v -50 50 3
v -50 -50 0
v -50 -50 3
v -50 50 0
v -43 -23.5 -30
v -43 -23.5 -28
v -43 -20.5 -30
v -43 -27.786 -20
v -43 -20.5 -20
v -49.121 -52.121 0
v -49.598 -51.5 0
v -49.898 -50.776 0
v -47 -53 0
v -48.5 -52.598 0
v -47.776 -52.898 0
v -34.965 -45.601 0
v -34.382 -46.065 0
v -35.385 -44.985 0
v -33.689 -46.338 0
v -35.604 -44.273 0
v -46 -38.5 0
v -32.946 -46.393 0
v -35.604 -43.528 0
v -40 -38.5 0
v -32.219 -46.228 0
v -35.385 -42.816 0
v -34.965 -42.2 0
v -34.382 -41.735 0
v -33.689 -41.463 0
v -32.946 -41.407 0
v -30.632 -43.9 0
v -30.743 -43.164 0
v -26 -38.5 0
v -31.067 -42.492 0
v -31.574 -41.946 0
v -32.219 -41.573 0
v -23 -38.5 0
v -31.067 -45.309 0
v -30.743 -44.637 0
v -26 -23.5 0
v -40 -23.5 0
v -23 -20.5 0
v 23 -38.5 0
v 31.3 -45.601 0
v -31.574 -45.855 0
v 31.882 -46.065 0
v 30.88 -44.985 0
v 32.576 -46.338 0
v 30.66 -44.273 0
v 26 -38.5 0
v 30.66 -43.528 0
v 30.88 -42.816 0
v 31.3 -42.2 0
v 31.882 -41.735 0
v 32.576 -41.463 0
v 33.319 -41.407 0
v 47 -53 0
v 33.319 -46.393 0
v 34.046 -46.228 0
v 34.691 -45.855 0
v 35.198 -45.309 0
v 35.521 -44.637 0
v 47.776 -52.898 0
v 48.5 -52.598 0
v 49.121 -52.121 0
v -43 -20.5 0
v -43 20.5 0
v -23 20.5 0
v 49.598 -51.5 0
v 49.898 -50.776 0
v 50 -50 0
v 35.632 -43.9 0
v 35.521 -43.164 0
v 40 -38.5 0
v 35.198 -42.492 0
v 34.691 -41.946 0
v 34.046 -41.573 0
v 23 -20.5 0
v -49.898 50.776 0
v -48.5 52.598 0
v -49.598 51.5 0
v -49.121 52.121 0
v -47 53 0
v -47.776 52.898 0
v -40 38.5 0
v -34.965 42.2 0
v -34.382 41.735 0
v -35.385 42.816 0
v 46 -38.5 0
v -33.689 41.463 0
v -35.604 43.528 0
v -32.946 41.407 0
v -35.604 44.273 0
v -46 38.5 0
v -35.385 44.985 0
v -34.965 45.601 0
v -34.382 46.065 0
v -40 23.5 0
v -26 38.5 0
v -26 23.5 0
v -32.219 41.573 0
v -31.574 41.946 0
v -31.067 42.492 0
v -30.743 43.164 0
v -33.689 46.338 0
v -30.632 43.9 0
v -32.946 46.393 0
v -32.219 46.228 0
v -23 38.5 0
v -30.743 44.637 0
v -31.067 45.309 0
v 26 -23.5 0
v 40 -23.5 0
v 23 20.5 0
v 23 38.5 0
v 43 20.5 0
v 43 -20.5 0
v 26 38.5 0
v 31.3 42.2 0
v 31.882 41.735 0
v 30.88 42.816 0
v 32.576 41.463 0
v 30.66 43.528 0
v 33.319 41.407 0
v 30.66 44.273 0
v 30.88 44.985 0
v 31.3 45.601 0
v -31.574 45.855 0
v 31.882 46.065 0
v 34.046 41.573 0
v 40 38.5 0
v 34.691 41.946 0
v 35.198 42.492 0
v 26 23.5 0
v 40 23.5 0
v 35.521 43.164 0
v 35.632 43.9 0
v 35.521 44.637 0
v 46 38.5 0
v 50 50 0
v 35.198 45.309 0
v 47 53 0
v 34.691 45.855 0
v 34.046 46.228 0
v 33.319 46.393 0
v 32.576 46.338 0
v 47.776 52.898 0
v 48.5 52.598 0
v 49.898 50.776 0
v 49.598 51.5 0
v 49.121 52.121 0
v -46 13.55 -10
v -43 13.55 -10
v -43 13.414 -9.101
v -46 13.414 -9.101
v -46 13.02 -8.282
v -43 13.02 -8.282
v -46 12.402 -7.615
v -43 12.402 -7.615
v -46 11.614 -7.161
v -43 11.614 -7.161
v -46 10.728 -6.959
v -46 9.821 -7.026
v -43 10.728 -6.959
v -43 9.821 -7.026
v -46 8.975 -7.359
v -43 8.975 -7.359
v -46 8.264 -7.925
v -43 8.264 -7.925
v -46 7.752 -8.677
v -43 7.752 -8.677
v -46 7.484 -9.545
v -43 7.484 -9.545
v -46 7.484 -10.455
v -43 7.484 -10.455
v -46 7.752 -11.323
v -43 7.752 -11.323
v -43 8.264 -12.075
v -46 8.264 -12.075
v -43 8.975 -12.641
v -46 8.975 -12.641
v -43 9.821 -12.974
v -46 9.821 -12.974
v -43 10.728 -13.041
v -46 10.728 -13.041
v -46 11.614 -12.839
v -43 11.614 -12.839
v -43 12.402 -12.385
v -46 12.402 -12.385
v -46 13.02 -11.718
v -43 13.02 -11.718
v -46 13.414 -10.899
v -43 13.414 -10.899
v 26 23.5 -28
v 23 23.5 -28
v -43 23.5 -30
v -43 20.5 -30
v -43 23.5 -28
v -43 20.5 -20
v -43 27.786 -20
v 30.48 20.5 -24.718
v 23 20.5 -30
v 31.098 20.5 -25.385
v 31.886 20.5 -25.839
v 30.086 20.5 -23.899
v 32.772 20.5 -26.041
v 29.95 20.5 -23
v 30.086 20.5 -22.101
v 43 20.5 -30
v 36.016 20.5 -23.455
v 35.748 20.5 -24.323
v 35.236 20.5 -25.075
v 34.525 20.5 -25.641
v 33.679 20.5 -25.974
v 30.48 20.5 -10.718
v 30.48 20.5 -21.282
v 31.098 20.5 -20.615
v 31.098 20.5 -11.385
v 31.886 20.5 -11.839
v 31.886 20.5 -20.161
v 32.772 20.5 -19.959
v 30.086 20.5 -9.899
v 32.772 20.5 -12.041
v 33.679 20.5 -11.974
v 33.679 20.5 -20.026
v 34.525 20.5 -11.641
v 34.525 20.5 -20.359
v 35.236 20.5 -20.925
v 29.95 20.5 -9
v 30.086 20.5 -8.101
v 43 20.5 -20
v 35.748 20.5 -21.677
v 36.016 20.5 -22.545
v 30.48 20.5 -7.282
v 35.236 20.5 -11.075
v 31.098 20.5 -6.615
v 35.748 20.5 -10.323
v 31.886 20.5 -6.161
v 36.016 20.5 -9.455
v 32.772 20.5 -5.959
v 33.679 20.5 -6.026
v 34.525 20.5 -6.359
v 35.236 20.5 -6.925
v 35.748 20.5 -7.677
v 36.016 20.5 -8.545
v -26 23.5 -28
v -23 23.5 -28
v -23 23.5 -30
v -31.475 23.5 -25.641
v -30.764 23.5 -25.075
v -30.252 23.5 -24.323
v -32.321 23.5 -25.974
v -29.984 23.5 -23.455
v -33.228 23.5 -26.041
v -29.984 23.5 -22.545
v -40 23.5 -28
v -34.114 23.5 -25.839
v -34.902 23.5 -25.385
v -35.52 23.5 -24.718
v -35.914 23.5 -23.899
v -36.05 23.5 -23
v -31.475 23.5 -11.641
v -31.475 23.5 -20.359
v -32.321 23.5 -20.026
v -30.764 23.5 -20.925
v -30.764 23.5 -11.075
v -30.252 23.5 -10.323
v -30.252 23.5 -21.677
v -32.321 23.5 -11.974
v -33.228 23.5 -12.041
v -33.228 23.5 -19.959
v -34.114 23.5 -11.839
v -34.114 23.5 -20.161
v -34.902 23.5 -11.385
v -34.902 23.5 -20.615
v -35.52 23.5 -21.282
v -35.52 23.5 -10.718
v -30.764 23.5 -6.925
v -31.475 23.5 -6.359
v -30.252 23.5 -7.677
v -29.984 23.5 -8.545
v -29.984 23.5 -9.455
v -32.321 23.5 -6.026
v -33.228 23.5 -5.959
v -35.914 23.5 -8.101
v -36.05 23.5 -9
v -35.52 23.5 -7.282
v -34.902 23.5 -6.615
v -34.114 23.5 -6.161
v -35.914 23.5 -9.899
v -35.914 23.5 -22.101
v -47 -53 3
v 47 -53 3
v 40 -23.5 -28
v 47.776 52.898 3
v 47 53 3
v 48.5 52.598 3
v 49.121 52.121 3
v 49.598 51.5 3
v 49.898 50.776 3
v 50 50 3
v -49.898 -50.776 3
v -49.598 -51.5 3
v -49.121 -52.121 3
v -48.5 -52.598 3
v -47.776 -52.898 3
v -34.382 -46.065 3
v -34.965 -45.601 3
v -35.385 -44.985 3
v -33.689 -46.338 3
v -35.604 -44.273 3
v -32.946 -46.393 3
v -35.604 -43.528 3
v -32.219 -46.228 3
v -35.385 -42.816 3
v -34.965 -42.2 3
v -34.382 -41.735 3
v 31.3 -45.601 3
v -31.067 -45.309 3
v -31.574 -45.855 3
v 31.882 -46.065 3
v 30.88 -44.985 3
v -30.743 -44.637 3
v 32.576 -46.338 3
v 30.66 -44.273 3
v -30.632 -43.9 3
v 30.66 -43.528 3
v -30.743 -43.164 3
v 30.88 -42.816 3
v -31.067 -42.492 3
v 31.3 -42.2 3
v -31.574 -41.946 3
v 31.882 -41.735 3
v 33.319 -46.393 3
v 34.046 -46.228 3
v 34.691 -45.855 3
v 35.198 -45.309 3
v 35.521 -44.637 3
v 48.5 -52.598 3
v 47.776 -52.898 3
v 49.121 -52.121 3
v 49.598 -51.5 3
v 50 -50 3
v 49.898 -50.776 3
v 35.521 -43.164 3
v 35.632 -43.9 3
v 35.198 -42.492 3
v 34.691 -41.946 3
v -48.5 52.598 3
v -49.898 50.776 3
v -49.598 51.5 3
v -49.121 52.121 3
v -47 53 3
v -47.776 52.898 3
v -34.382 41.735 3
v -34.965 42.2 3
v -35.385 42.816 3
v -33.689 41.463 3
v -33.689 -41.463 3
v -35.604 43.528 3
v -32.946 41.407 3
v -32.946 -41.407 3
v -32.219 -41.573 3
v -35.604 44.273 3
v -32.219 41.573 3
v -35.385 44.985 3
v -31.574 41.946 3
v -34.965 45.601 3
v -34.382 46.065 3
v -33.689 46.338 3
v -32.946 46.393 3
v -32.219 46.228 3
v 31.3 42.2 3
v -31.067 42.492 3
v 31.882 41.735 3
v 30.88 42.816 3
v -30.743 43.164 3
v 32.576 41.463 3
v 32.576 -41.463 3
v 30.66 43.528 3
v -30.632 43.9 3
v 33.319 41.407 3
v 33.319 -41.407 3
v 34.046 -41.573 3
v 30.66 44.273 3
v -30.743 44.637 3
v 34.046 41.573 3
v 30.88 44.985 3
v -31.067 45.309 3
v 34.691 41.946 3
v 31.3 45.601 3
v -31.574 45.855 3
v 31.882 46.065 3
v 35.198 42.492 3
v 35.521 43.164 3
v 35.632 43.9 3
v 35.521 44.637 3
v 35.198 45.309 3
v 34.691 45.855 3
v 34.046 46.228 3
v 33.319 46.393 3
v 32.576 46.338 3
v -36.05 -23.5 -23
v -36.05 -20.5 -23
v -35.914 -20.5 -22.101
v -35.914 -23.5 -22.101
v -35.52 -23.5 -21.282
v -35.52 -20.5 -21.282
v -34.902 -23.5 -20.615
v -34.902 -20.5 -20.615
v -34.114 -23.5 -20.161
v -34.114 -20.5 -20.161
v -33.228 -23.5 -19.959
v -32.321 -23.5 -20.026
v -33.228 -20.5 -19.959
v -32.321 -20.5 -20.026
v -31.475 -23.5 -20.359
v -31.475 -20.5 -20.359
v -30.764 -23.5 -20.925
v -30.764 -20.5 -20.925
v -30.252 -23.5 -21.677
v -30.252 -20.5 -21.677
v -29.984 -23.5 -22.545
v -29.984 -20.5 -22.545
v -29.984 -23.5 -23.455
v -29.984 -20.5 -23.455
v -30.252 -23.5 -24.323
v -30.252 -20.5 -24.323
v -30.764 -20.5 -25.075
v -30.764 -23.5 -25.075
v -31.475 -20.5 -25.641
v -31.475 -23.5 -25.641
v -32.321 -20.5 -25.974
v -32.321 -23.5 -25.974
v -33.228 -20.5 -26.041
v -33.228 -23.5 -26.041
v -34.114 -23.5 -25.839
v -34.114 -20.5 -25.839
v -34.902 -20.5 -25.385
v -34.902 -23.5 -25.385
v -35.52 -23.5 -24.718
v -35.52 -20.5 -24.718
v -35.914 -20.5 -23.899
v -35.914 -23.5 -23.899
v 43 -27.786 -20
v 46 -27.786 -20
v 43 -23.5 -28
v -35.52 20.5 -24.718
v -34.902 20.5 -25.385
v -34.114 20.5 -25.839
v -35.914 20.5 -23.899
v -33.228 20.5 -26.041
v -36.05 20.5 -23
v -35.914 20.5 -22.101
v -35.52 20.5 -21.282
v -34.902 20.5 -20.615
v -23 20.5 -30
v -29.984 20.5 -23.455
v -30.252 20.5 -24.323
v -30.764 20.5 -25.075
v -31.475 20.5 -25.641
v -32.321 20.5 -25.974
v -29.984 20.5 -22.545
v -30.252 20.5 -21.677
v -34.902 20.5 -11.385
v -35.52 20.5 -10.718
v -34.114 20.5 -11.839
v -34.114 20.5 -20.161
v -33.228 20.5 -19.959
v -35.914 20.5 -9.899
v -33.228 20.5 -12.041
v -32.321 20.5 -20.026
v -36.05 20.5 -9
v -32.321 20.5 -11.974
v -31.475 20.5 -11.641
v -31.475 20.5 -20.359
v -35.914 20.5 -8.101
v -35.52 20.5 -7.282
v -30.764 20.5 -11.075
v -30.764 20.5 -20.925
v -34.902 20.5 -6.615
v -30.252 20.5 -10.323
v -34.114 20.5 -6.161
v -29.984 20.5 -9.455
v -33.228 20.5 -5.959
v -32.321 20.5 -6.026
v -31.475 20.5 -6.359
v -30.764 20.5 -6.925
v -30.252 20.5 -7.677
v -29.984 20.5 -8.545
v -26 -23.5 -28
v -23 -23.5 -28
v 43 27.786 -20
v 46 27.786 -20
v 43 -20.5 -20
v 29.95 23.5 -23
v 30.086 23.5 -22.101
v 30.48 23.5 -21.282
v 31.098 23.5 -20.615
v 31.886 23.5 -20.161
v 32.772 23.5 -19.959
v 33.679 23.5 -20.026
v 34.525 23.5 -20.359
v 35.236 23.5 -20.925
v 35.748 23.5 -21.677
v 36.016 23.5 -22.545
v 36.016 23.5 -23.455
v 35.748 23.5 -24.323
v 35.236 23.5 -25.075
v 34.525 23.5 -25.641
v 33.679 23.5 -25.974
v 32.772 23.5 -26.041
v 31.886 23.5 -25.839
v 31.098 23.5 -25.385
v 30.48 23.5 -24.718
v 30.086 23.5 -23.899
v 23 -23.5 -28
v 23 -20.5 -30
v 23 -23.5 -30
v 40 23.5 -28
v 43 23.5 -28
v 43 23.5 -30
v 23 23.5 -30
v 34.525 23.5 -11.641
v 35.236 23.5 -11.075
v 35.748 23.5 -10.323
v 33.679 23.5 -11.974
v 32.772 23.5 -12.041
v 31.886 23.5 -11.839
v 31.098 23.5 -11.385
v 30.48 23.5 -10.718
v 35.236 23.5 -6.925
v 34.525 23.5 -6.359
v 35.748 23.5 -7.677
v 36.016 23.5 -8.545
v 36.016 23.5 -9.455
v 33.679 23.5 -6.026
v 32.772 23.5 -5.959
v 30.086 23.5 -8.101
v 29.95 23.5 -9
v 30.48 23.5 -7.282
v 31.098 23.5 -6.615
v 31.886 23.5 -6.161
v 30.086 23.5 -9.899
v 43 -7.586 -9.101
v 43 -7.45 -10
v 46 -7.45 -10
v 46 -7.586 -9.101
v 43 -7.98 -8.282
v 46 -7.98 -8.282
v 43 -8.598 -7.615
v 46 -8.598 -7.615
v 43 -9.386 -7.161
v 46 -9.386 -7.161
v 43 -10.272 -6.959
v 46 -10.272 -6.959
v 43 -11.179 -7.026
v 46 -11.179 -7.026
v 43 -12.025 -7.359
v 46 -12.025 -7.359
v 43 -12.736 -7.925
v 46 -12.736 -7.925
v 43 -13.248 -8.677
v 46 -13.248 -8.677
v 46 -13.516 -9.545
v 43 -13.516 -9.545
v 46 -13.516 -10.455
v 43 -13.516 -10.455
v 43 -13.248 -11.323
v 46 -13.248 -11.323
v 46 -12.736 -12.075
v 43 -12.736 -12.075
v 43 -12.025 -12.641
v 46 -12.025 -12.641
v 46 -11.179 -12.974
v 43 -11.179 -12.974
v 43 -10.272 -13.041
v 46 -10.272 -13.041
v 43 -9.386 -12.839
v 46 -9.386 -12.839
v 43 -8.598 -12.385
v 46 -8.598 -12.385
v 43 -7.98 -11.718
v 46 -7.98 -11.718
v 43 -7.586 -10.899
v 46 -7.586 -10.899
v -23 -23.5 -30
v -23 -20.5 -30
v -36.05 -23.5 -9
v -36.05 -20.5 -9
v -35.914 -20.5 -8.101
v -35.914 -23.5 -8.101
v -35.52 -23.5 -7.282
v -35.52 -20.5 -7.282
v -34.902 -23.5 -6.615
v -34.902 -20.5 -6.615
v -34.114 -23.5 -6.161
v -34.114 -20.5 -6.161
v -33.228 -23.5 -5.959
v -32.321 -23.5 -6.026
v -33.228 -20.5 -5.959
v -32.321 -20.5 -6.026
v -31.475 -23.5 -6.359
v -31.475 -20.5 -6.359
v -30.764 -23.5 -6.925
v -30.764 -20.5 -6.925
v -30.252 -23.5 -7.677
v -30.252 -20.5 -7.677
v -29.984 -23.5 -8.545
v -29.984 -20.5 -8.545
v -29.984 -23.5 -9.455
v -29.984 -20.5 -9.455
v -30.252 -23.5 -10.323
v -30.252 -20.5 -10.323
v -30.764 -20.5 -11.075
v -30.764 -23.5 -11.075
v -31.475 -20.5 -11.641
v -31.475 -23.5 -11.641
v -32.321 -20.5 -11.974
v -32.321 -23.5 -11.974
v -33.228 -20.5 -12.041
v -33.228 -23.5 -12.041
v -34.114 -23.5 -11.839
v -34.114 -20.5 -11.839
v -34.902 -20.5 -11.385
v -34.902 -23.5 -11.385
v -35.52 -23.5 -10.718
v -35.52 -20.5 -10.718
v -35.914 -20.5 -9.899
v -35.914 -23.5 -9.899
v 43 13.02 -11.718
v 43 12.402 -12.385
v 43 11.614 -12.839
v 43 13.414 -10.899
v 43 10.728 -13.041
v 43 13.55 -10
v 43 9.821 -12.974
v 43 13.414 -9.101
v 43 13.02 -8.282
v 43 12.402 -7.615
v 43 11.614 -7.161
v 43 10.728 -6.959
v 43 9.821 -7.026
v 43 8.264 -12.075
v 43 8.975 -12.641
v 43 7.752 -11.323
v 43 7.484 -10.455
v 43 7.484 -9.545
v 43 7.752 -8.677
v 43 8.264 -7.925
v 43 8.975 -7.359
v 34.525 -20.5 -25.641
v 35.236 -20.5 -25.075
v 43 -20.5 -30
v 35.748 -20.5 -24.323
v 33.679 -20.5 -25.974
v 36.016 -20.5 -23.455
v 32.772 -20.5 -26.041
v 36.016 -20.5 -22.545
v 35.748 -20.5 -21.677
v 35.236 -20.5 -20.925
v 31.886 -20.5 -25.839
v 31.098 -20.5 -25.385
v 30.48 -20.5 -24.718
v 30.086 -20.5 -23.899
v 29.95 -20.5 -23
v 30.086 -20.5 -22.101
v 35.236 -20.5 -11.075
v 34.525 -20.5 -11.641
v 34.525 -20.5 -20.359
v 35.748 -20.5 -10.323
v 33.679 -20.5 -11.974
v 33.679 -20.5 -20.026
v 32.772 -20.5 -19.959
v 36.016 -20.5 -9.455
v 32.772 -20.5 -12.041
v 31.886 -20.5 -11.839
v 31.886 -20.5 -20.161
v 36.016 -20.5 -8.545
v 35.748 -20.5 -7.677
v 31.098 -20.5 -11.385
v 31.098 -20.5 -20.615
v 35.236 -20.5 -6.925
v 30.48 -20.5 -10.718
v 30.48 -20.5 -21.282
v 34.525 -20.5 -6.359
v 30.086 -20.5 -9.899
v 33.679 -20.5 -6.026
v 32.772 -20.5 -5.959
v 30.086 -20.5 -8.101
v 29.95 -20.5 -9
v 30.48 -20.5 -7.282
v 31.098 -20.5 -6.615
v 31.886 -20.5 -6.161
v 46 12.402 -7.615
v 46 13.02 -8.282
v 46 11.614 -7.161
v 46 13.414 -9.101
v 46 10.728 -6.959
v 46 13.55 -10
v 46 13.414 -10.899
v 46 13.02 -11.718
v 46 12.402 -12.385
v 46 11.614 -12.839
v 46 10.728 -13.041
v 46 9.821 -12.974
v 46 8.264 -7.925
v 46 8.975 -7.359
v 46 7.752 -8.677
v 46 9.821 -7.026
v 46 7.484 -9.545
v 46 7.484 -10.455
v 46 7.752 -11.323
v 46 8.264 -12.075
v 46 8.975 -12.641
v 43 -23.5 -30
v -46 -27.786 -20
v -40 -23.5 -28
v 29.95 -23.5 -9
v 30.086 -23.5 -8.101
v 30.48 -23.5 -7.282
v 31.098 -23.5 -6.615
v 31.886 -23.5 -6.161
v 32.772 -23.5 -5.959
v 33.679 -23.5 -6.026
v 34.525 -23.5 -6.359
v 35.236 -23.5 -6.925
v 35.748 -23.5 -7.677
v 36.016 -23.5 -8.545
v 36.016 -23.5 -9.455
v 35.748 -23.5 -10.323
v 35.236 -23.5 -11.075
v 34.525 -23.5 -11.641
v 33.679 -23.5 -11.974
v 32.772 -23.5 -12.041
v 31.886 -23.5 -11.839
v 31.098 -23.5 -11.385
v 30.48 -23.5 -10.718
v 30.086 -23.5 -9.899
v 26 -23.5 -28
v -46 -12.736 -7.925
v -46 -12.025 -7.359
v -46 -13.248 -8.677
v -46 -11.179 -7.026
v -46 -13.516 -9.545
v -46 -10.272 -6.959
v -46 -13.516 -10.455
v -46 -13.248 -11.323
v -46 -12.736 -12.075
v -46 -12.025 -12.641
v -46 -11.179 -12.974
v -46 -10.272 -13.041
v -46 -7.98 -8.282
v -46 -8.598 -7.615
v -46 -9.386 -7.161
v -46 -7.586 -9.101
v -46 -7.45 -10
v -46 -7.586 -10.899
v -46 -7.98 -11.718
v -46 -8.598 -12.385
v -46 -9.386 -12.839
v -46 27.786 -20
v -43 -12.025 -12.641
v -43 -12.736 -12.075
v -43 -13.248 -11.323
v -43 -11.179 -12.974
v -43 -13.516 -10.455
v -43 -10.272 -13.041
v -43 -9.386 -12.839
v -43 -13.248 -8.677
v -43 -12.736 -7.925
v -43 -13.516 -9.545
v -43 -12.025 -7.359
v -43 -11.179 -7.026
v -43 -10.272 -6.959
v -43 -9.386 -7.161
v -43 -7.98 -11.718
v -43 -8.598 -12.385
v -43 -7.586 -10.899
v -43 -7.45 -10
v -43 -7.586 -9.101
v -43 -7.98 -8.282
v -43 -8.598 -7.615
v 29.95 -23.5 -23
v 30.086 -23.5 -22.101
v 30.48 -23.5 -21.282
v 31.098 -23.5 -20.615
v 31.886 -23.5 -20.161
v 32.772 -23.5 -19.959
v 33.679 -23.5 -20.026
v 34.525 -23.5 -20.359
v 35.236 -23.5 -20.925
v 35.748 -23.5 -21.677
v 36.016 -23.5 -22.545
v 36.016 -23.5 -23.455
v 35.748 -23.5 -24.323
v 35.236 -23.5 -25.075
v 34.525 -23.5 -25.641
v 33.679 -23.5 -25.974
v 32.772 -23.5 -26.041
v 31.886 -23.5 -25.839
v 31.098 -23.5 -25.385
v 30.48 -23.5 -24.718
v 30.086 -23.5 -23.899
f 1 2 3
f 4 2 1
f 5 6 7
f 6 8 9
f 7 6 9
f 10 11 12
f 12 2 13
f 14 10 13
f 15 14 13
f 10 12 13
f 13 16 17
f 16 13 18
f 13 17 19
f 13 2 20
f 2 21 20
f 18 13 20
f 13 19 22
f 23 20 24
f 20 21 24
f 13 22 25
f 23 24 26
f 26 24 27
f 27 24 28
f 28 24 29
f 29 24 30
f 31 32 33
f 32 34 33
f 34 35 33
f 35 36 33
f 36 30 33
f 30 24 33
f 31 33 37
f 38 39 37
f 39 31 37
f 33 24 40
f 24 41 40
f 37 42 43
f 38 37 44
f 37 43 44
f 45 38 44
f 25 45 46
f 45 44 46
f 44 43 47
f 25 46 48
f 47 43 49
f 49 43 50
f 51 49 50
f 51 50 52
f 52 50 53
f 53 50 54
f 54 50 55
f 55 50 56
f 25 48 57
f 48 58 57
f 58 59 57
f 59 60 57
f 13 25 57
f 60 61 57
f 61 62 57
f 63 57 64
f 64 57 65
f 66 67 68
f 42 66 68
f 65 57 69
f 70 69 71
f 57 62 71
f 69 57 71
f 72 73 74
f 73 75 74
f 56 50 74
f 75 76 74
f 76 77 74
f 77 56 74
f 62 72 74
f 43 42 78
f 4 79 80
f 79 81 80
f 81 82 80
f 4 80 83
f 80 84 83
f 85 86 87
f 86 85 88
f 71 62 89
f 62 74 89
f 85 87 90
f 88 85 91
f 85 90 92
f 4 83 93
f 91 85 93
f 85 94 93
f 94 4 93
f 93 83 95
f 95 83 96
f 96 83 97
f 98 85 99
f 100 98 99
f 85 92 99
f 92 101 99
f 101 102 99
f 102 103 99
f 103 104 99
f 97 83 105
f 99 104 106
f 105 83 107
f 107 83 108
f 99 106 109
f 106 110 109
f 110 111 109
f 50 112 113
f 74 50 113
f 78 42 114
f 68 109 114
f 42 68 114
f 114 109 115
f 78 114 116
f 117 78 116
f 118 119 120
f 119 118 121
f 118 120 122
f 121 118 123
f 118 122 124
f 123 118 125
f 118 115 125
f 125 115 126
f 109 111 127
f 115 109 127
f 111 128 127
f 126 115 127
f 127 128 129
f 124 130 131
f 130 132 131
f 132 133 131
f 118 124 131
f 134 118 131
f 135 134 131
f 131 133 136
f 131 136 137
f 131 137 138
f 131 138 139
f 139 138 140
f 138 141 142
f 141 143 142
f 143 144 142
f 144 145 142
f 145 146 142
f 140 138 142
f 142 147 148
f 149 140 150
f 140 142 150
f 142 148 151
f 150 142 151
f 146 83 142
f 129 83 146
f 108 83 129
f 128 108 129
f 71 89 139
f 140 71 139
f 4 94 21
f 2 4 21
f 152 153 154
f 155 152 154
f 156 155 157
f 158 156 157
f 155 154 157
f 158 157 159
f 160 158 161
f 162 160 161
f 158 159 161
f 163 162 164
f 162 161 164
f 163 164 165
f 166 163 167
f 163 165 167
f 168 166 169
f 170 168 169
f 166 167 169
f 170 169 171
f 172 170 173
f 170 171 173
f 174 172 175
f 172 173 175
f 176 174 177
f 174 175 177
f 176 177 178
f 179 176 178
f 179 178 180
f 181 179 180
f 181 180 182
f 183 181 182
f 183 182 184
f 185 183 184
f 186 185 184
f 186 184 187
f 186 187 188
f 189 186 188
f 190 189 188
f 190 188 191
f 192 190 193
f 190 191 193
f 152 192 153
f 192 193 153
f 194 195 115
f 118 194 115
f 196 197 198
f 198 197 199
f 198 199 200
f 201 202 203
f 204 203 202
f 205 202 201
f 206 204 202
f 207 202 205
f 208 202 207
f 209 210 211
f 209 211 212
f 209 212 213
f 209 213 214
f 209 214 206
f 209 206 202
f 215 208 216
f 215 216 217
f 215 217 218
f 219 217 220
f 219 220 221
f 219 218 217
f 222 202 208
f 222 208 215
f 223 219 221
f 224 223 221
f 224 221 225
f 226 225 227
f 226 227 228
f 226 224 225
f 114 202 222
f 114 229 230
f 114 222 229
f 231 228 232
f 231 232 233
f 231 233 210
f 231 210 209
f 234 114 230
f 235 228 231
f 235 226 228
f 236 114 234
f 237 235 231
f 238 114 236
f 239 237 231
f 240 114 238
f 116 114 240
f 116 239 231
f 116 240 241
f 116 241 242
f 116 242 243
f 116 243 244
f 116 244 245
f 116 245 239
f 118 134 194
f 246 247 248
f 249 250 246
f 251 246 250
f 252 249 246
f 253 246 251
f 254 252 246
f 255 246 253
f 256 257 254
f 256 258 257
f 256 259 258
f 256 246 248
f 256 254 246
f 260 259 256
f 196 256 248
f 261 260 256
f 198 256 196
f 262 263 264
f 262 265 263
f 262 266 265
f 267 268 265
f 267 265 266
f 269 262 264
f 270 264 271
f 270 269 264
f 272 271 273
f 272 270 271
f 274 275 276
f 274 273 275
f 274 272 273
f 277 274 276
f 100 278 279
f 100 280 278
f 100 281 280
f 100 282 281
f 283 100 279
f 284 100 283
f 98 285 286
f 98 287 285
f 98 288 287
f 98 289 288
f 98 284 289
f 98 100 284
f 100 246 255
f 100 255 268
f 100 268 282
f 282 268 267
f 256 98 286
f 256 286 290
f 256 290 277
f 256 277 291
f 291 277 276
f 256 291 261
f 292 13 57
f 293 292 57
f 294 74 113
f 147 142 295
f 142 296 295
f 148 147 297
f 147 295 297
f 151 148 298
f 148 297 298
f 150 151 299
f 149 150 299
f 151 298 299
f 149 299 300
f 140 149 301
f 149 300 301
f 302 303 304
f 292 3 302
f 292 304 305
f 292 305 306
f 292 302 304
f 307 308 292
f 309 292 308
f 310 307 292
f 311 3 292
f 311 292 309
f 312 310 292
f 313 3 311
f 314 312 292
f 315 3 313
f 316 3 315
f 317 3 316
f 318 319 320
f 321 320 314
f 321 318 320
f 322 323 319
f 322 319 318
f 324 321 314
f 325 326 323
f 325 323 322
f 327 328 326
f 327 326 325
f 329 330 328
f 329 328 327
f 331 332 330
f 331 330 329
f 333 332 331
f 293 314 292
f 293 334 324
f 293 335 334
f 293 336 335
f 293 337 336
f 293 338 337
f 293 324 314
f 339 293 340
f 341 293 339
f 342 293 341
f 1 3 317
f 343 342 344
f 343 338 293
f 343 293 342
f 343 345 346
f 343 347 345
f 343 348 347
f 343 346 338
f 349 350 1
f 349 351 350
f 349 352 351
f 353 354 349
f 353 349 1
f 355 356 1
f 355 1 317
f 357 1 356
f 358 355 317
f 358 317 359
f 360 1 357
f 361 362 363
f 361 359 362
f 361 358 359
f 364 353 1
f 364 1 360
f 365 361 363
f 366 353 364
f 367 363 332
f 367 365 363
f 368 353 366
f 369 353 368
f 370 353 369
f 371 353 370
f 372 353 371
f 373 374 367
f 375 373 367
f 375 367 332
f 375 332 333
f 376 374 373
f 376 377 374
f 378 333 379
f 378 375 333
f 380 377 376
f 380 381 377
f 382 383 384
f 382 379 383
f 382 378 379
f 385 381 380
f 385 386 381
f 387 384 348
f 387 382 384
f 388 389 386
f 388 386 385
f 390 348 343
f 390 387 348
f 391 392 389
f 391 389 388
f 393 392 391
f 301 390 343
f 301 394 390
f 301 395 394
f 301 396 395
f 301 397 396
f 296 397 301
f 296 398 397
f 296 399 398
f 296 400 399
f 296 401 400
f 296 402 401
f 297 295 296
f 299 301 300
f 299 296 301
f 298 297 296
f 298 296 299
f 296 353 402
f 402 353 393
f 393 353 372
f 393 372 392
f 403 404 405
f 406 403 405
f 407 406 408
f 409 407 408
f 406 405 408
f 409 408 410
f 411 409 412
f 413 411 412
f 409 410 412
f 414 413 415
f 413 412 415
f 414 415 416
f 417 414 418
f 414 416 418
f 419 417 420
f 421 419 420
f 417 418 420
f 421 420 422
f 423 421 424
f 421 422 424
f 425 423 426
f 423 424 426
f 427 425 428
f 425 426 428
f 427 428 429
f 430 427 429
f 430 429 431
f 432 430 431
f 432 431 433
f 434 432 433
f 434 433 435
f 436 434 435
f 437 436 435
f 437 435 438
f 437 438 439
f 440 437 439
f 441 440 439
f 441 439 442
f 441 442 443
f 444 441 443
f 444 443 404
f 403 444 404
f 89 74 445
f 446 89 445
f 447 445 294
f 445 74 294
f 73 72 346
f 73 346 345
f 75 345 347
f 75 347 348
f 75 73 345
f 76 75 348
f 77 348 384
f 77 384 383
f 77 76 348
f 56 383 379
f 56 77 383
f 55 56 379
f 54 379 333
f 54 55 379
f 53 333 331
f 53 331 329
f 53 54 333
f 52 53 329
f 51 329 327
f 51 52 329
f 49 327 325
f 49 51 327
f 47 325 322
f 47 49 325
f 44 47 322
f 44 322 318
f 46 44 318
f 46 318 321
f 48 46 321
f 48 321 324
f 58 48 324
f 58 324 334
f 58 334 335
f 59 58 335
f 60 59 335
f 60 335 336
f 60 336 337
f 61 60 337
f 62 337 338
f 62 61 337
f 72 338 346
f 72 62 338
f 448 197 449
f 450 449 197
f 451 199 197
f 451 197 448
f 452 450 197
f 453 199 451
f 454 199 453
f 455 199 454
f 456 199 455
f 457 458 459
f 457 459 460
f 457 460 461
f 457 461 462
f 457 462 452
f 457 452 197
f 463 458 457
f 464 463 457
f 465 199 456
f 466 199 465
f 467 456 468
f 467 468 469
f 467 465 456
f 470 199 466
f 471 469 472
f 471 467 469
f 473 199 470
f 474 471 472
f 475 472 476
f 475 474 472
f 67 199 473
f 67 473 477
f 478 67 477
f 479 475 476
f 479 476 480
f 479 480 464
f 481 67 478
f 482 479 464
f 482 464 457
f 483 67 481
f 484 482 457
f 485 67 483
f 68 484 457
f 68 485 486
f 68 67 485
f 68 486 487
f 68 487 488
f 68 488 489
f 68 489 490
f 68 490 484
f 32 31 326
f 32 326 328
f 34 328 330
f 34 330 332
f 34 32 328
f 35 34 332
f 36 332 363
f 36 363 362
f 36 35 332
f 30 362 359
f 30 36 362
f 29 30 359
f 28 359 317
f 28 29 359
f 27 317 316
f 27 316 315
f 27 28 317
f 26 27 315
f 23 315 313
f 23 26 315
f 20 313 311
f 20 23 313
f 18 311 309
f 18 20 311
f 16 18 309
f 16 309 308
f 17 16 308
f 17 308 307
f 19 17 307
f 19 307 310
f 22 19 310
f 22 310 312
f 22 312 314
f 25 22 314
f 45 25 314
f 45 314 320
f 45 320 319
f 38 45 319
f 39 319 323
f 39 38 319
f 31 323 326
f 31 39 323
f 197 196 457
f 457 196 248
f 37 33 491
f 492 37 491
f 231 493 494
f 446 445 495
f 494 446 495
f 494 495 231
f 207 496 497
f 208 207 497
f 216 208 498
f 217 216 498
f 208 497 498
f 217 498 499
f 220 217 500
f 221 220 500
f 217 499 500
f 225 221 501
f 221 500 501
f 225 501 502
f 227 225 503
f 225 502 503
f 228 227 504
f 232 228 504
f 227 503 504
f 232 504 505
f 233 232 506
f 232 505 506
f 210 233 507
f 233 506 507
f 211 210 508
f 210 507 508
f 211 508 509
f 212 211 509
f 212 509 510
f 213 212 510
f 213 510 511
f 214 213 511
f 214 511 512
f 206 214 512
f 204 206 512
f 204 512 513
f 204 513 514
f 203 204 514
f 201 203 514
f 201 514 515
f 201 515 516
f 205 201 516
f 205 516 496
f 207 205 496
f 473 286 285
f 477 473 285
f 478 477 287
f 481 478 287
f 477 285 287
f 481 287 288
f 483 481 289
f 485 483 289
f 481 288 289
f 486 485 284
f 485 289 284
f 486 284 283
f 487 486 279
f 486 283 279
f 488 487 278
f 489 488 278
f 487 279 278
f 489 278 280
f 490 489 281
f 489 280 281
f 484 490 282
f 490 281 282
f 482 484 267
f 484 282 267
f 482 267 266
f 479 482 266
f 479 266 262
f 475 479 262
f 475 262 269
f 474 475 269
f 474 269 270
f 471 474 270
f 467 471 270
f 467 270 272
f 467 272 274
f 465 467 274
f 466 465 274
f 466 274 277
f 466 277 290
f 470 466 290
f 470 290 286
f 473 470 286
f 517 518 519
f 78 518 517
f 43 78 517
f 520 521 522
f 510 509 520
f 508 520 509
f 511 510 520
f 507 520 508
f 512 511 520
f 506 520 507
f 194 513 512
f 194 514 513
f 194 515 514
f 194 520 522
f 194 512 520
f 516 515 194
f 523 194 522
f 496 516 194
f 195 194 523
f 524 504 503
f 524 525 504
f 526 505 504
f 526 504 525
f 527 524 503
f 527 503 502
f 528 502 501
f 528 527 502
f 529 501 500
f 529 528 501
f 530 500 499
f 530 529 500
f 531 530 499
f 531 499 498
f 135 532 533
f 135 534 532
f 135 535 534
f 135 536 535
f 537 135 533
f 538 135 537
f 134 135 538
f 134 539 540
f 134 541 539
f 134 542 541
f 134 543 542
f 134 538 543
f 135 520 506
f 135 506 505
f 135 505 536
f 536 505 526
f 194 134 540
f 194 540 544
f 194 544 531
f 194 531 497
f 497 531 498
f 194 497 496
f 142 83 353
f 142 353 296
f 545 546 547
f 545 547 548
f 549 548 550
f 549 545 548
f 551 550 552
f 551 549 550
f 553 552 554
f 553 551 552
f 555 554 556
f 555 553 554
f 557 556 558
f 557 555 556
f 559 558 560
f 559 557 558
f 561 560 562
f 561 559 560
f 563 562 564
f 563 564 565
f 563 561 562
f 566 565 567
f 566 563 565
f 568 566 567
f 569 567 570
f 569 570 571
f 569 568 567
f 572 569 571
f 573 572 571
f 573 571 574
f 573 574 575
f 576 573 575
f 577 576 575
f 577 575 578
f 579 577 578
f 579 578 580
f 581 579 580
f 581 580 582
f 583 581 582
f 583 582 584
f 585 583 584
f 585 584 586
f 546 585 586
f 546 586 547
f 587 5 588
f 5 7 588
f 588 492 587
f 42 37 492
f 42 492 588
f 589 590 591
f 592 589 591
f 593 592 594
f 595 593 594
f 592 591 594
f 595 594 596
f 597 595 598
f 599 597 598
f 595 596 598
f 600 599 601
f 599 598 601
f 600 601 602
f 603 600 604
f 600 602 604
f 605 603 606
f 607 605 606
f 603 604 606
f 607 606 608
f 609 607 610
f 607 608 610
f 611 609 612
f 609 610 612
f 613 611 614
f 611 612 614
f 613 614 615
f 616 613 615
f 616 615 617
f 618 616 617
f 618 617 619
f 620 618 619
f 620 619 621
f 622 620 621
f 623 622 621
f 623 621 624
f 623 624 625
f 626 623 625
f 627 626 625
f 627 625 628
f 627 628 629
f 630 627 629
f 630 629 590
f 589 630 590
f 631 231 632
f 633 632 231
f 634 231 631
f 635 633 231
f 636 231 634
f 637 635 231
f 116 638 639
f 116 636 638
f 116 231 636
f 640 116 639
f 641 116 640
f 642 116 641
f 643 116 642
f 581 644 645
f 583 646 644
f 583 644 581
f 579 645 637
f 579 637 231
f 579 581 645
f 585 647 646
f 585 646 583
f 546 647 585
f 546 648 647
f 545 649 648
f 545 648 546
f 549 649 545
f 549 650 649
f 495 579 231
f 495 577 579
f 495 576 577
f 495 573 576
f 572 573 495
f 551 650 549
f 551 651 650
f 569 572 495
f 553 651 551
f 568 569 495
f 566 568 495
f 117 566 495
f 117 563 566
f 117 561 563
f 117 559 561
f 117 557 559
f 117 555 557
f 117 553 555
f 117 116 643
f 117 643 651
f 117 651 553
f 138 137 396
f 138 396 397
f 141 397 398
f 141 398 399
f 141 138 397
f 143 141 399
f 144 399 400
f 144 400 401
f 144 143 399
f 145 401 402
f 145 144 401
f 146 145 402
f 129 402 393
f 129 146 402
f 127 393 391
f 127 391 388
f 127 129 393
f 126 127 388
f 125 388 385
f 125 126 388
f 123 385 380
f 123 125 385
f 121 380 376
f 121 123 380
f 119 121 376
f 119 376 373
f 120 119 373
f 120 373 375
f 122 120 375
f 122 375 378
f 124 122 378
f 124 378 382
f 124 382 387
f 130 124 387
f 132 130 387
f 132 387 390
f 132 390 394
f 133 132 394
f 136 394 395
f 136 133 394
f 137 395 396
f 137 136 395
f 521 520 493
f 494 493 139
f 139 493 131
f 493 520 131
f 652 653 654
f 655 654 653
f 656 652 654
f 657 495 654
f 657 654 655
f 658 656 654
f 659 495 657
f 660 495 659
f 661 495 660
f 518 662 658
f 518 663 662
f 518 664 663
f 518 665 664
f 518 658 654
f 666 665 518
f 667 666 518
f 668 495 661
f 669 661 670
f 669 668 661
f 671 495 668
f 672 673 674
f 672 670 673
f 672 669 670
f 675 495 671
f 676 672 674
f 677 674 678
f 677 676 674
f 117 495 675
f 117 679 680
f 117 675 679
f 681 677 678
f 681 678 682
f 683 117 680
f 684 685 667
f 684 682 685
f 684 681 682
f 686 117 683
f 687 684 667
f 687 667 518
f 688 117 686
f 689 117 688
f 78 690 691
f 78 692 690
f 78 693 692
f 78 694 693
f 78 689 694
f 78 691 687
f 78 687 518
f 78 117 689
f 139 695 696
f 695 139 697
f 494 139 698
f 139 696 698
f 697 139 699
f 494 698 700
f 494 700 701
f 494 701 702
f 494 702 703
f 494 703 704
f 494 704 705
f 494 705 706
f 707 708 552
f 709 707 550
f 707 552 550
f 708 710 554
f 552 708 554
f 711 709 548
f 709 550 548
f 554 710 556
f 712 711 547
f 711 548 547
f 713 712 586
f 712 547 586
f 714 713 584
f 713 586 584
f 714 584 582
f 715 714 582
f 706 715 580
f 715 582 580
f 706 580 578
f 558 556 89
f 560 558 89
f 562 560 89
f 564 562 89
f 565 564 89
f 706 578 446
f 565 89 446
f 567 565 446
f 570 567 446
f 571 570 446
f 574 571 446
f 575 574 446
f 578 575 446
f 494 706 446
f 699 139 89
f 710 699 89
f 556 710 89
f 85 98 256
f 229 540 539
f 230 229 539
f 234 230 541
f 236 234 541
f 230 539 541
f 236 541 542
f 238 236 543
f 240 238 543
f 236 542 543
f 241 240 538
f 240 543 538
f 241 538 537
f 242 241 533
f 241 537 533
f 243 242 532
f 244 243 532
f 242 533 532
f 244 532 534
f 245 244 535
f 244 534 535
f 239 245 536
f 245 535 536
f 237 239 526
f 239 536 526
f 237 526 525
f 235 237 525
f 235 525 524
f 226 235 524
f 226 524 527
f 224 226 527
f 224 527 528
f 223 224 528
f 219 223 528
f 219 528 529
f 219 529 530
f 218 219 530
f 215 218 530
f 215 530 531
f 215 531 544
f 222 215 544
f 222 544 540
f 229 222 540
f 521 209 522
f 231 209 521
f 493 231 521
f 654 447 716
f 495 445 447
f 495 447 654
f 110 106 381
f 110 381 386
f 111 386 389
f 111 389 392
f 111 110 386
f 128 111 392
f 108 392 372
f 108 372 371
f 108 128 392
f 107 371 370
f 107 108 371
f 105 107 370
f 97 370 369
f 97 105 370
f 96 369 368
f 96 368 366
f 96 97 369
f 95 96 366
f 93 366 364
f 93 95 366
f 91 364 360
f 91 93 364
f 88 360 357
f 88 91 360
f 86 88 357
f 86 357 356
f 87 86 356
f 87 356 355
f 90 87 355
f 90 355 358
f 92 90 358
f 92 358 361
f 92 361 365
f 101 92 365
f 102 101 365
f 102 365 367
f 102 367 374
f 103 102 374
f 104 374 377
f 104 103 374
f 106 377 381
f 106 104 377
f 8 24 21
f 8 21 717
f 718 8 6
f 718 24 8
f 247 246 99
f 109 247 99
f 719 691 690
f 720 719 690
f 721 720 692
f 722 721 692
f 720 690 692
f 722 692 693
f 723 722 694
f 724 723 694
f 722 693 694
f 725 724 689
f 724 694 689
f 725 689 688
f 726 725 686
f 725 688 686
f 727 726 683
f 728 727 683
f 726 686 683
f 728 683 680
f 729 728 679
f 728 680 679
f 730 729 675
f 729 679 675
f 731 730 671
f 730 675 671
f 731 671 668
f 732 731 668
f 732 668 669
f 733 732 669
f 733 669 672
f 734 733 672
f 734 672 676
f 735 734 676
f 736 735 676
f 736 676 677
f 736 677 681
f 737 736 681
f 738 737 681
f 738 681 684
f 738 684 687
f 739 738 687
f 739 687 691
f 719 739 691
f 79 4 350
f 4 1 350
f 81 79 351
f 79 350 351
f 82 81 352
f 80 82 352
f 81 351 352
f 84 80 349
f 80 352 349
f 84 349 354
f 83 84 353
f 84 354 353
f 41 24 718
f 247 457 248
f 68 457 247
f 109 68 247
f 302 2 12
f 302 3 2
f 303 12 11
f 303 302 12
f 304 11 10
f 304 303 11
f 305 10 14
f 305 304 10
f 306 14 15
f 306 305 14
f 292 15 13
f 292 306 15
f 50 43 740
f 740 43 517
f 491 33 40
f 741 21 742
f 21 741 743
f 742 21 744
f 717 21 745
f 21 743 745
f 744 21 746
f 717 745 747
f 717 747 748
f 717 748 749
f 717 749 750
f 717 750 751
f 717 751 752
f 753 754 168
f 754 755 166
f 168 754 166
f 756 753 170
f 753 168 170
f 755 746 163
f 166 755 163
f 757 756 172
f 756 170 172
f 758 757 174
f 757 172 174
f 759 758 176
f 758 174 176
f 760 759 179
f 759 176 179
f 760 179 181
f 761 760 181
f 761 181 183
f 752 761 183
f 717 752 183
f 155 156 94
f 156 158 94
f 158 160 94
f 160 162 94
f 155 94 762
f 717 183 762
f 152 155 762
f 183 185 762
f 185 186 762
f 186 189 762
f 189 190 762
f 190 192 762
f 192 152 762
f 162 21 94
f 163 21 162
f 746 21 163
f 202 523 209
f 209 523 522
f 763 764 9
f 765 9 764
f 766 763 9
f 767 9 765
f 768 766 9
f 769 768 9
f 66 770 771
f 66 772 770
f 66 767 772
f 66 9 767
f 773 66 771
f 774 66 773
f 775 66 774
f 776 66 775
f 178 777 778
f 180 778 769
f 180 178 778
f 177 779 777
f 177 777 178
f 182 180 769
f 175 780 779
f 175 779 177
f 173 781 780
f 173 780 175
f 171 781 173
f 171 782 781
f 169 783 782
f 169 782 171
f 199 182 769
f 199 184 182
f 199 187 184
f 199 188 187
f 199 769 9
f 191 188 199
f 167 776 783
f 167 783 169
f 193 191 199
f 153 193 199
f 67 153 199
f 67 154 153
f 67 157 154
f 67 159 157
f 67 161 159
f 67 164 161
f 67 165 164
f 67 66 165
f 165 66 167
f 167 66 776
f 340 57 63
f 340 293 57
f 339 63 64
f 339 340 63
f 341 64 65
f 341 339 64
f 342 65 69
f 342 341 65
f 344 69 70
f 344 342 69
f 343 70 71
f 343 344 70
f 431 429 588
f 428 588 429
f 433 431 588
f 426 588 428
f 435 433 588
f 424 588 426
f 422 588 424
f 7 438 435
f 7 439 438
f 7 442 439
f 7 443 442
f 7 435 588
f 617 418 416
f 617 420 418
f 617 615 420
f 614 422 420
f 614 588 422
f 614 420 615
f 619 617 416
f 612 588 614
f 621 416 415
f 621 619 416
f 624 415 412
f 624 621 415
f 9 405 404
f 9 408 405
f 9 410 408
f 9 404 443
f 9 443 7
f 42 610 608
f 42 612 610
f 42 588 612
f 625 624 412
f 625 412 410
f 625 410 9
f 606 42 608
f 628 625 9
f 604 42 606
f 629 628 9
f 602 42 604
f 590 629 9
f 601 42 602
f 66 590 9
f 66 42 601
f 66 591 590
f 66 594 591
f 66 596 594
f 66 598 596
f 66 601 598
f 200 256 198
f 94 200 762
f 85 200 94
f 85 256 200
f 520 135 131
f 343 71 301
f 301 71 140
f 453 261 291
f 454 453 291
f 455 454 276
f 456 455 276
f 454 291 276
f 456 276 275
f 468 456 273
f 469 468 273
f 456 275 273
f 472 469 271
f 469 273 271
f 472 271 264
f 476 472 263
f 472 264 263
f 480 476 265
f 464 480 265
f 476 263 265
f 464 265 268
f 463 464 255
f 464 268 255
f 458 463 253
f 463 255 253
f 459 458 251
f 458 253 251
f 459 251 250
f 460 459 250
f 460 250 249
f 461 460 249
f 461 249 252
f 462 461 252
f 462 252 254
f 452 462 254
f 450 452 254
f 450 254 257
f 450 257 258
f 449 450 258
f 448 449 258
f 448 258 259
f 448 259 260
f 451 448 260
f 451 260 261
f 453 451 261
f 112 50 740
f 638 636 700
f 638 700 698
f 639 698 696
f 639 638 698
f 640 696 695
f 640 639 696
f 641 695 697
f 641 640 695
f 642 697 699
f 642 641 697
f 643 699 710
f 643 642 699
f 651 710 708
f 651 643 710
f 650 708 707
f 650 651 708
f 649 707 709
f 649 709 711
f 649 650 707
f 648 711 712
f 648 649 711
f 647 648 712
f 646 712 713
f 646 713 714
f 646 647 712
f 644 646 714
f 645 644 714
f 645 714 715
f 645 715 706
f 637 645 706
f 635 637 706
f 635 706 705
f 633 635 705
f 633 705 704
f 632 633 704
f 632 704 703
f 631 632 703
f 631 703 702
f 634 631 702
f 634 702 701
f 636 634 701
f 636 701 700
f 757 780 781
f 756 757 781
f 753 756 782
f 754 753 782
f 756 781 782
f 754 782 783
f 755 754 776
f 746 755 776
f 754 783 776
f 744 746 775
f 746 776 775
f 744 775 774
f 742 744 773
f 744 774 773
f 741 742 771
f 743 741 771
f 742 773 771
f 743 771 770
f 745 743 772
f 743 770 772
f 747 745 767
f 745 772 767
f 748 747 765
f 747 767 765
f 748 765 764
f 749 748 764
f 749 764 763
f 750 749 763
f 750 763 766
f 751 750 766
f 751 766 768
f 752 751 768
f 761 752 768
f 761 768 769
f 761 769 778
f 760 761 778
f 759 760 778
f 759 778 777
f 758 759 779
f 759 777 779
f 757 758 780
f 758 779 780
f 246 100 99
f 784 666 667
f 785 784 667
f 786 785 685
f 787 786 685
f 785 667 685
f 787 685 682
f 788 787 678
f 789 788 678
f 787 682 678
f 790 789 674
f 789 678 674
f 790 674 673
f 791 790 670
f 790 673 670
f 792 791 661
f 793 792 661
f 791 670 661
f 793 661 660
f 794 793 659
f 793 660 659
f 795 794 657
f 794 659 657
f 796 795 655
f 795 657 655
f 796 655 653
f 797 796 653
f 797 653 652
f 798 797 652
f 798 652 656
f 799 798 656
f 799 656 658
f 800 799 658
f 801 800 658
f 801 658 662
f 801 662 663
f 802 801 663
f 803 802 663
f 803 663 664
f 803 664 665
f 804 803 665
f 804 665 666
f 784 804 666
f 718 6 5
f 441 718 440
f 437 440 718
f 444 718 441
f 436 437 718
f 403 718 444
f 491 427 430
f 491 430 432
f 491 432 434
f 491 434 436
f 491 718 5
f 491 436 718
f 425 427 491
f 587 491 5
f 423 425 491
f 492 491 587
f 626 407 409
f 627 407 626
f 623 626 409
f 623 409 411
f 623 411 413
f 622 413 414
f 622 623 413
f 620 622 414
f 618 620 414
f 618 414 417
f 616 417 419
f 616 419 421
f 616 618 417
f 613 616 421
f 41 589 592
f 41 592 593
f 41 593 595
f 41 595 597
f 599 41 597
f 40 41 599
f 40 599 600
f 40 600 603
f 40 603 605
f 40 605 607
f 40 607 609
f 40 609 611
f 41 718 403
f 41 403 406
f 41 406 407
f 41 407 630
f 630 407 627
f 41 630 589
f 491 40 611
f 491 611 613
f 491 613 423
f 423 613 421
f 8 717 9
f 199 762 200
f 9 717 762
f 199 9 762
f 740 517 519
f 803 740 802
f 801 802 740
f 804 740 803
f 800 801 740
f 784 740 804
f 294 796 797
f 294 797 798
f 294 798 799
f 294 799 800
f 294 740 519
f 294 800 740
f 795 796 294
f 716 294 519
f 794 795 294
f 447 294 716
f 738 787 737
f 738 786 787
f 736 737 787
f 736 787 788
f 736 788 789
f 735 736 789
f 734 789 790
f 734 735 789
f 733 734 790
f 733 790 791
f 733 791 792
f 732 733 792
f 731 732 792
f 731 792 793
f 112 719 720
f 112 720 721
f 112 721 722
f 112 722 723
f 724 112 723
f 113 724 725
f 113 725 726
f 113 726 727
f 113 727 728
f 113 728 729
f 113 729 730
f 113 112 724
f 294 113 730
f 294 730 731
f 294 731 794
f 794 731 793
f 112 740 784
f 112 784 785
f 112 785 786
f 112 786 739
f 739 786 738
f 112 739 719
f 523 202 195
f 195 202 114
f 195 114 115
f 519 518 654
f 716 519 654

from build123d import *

# Parameters (mm, degrees)
F0_W           = 100
F0_H           = 106
F0_R           = 2.5
F1_DEPTH       = 3
F2_R           = 3
F4_DEPTH       = 28
F5_DEPTH       = 20
F3_W           = 3
F3_H           = 15
F6_DEPTH       = 28
F7_DEPTH       = 15
F7_DEPTH_BACK  = 62
F9_DEPTH       = 20
F9_DEPTH_BACK  = 72
F11_DEPTH      = 20
F11_DEPTH_BACK = 72
F12_R          = 3.05
F13_R          = 3.05
F14_DEPTH      = 47
F15_R          = 3.05
F16_DEPTH      = 3
F16_DEPTH_BACK = 89
F17_DEPTH      = 2


with BuildPart() as f1:
    # F0 (on Top) → F1 (new body)
    with BuildSketch(Plane.XY):
        Rectangle(F0_W, F0_H)
        with Locations((-33.1323798252, -43.9004032683)):
            Circle(F0_R, mode=Mode.SUBTRACT)
        with Locations((33.1323798252, -43.9004032683)):
            Circle(F0_R, mode=Mode.SUBTRACT)
        with Locations((-33.1323798252, 43.9004032683)):
            Circle(F0_R, mode=Mode.SUBTRACT)
        with Locations((33.1323798252, 43.9004032683)):
            Circle(F0_R, mode=Mode.SUBTRACT)
    extrude(amount=F1_DEPTH)

    # F2
    f2_edges = [f1.edges().sort_by_distance(p)[0] for p in [
        (-50, -53, 1.5),
        (-50, 53, 1.5),
        (50, 53, 1.5),
        (50, -53, 1.5),
    ]]
    fillet(f2_edges, radius=F2_R)

    # F3 (on Top) → F4 (join)
    with BuildSketch(Plane.XY):
        Polygon((-23, -20.5), (-43, -20.5), (-43, -23.5), (-40, -23.5), (-26, -23.5), (-23, -23.5), align=None)
        Polygon((-43, 23.5), (-43, 20.5), (-23, 20.5), (-23, 23.5), (-26, 23.5), (-40, 23.5), align=None)
        Polygon((23, 20.5), (43, 20.5), (43, 23.5), (40, 23.5), (26, 23.5), (23, 23.5), align=None)
        Polygon((43, -23.5), (43, -20.5), (23, -20.5), (23, -23.5), (26, -23.5), (40, -23.5), align=None)
    extrude(amount=-F4_DEPTH)

    # F3 (on Top) → F5 (join)
    with BuildSketch(Plane.XY):
        Polygon((43, 20.5), (43, -20.5), (43, -23.5), (46, -23.5), (46, 23.5), (43, 23.5), align=None)
        Polygon((-43, -20.5), (-43, 20.5), (-43, 23.5), (-46, 23.5), (-46, -23.5), (-43, -23.5), align=None)
    extrude(amount=-F5_DEPTH)

    # F3 (on Top) → F6 (join)
    with BuildSketch(Plane.XY):
        with Locations((-41.5, 31)):
            Rectangle(F3_W, F3_H)
        with Locations((-24.5, 31)):
            Rectangle(F3_W, F3_H)
        with Locations((24.5, 31)):
            Rectangle(F3_W, F3_H)
        with Locations((41.5, 31)):
            Rectangle(F3_W, F3_H)
        with Locations((-41.5, -31)):
            Rectangle(F3_W, F3_H)
        with Locations((-24.5, -31)):
            Rectangle(F3_W, F3_H)
        with Locations((24.5, -31)):
            Rectangle(F3_W, F3_H)
        with Locations((41.5, -31)):
            Rectangle(F3_W, F3_H)
    extrude(amount=-F6_DEPTH)

    # F7 (add, two sides): faces of the model
    f7_faces = [f1.faces().sort_by_distance(p)[0] for p in [
        (-44.5, -23.5, -10),
        (44.5, -23.5, -10),
    ]]
    extrude(f7_faces, amount=F7_DEPTH)
    extrude(f7_faces, amount=-F7_DEPTH_BACK)

    # F8 (on face) → F9 (cut, two sides)
    with BuildSketch(Plane(origin=(-26, 0, 0), x_dir=(0, -1, 0), z_dir=(-1, 0, 0))) as f9_sk:
        Polygon((-23.5, -28), (-38.5, 0), (-38.5, -28), align=None)
    extrude(amount=F9_DEPTH, mode=Mode.SUBTRACT)
    extrude(f9_sk.sketch, amount=-F9_DEPTH_BACK, mode=Mode.SUBTRACT)

    # F10 (on face) → F11 (cut, two sides)
    with BuildSketch(Plane(origin=(-26, 0, 0), x_dir=(0, -1, 0), z_dir=(-1, 0, 0))) as f11_sk:
        Polygon((38.5, 0), (23.5, -28), (38.5, -28), align=None)
    extrude(amount=F11_DEPTH, mode=Mode.SUBTRACT)
    extrude(f11_sk.sketch, amount=-F11_DEPTH_BACK, mode=Mode.SUBTRACT)

    # F12 (on face) + F13 (on face) → F14 (cut, through all)
    with BuildSketch(Plane(origin=(0, 23.5, 0), x_dir=(-1, 0, 0), z_dir=(0, 1, 0))):
        with Locations((33, -23)):
            Circle(F12_R)
        with Locations((33, -9)):
            Circle(F12_R)
    with BuildSketch(Plane(origin=(0, 23.5, 0), x_dir=(-1, 0, 0), z_dir=(0, 1, 0))):
        with Locations((-33, -9)):
            Circle(F13_R)
        with Locations((-33, -23)):
            Circle(F13_R)
    extrude(amount=-F14_DEPTH, mode=Mode.SUBTRACT)

    # F15 (on face) → F16 (cut, two sides)
    with BuildSketch(Plane.YZ.offset(-43)) as f16_sk:
        with Locations((10.5, -10)):
            Circle(F15_R)
        with Locations((-10.5, -10)):
            Circle(F15_R)
    extrude(amount=-F16_DEPTH, mode=Mode.SUBTRACT)
    extrude(f16_sk.sketch, amount=F16_DEPTH_BACK, mode=Mode.SUBTRACT)

    # F17 (add): faces of the model
    f17_faces = [f1.faces().sort_by_distance(p)[0] for p in [
        (33, -22, -28),
        (-33, -22, -28),
        (-33, 22, -28),
        (33, 22, -28),
    ]]
    extrude(f17_faces, amount=F17_DEPTH)


solid = f1.part
